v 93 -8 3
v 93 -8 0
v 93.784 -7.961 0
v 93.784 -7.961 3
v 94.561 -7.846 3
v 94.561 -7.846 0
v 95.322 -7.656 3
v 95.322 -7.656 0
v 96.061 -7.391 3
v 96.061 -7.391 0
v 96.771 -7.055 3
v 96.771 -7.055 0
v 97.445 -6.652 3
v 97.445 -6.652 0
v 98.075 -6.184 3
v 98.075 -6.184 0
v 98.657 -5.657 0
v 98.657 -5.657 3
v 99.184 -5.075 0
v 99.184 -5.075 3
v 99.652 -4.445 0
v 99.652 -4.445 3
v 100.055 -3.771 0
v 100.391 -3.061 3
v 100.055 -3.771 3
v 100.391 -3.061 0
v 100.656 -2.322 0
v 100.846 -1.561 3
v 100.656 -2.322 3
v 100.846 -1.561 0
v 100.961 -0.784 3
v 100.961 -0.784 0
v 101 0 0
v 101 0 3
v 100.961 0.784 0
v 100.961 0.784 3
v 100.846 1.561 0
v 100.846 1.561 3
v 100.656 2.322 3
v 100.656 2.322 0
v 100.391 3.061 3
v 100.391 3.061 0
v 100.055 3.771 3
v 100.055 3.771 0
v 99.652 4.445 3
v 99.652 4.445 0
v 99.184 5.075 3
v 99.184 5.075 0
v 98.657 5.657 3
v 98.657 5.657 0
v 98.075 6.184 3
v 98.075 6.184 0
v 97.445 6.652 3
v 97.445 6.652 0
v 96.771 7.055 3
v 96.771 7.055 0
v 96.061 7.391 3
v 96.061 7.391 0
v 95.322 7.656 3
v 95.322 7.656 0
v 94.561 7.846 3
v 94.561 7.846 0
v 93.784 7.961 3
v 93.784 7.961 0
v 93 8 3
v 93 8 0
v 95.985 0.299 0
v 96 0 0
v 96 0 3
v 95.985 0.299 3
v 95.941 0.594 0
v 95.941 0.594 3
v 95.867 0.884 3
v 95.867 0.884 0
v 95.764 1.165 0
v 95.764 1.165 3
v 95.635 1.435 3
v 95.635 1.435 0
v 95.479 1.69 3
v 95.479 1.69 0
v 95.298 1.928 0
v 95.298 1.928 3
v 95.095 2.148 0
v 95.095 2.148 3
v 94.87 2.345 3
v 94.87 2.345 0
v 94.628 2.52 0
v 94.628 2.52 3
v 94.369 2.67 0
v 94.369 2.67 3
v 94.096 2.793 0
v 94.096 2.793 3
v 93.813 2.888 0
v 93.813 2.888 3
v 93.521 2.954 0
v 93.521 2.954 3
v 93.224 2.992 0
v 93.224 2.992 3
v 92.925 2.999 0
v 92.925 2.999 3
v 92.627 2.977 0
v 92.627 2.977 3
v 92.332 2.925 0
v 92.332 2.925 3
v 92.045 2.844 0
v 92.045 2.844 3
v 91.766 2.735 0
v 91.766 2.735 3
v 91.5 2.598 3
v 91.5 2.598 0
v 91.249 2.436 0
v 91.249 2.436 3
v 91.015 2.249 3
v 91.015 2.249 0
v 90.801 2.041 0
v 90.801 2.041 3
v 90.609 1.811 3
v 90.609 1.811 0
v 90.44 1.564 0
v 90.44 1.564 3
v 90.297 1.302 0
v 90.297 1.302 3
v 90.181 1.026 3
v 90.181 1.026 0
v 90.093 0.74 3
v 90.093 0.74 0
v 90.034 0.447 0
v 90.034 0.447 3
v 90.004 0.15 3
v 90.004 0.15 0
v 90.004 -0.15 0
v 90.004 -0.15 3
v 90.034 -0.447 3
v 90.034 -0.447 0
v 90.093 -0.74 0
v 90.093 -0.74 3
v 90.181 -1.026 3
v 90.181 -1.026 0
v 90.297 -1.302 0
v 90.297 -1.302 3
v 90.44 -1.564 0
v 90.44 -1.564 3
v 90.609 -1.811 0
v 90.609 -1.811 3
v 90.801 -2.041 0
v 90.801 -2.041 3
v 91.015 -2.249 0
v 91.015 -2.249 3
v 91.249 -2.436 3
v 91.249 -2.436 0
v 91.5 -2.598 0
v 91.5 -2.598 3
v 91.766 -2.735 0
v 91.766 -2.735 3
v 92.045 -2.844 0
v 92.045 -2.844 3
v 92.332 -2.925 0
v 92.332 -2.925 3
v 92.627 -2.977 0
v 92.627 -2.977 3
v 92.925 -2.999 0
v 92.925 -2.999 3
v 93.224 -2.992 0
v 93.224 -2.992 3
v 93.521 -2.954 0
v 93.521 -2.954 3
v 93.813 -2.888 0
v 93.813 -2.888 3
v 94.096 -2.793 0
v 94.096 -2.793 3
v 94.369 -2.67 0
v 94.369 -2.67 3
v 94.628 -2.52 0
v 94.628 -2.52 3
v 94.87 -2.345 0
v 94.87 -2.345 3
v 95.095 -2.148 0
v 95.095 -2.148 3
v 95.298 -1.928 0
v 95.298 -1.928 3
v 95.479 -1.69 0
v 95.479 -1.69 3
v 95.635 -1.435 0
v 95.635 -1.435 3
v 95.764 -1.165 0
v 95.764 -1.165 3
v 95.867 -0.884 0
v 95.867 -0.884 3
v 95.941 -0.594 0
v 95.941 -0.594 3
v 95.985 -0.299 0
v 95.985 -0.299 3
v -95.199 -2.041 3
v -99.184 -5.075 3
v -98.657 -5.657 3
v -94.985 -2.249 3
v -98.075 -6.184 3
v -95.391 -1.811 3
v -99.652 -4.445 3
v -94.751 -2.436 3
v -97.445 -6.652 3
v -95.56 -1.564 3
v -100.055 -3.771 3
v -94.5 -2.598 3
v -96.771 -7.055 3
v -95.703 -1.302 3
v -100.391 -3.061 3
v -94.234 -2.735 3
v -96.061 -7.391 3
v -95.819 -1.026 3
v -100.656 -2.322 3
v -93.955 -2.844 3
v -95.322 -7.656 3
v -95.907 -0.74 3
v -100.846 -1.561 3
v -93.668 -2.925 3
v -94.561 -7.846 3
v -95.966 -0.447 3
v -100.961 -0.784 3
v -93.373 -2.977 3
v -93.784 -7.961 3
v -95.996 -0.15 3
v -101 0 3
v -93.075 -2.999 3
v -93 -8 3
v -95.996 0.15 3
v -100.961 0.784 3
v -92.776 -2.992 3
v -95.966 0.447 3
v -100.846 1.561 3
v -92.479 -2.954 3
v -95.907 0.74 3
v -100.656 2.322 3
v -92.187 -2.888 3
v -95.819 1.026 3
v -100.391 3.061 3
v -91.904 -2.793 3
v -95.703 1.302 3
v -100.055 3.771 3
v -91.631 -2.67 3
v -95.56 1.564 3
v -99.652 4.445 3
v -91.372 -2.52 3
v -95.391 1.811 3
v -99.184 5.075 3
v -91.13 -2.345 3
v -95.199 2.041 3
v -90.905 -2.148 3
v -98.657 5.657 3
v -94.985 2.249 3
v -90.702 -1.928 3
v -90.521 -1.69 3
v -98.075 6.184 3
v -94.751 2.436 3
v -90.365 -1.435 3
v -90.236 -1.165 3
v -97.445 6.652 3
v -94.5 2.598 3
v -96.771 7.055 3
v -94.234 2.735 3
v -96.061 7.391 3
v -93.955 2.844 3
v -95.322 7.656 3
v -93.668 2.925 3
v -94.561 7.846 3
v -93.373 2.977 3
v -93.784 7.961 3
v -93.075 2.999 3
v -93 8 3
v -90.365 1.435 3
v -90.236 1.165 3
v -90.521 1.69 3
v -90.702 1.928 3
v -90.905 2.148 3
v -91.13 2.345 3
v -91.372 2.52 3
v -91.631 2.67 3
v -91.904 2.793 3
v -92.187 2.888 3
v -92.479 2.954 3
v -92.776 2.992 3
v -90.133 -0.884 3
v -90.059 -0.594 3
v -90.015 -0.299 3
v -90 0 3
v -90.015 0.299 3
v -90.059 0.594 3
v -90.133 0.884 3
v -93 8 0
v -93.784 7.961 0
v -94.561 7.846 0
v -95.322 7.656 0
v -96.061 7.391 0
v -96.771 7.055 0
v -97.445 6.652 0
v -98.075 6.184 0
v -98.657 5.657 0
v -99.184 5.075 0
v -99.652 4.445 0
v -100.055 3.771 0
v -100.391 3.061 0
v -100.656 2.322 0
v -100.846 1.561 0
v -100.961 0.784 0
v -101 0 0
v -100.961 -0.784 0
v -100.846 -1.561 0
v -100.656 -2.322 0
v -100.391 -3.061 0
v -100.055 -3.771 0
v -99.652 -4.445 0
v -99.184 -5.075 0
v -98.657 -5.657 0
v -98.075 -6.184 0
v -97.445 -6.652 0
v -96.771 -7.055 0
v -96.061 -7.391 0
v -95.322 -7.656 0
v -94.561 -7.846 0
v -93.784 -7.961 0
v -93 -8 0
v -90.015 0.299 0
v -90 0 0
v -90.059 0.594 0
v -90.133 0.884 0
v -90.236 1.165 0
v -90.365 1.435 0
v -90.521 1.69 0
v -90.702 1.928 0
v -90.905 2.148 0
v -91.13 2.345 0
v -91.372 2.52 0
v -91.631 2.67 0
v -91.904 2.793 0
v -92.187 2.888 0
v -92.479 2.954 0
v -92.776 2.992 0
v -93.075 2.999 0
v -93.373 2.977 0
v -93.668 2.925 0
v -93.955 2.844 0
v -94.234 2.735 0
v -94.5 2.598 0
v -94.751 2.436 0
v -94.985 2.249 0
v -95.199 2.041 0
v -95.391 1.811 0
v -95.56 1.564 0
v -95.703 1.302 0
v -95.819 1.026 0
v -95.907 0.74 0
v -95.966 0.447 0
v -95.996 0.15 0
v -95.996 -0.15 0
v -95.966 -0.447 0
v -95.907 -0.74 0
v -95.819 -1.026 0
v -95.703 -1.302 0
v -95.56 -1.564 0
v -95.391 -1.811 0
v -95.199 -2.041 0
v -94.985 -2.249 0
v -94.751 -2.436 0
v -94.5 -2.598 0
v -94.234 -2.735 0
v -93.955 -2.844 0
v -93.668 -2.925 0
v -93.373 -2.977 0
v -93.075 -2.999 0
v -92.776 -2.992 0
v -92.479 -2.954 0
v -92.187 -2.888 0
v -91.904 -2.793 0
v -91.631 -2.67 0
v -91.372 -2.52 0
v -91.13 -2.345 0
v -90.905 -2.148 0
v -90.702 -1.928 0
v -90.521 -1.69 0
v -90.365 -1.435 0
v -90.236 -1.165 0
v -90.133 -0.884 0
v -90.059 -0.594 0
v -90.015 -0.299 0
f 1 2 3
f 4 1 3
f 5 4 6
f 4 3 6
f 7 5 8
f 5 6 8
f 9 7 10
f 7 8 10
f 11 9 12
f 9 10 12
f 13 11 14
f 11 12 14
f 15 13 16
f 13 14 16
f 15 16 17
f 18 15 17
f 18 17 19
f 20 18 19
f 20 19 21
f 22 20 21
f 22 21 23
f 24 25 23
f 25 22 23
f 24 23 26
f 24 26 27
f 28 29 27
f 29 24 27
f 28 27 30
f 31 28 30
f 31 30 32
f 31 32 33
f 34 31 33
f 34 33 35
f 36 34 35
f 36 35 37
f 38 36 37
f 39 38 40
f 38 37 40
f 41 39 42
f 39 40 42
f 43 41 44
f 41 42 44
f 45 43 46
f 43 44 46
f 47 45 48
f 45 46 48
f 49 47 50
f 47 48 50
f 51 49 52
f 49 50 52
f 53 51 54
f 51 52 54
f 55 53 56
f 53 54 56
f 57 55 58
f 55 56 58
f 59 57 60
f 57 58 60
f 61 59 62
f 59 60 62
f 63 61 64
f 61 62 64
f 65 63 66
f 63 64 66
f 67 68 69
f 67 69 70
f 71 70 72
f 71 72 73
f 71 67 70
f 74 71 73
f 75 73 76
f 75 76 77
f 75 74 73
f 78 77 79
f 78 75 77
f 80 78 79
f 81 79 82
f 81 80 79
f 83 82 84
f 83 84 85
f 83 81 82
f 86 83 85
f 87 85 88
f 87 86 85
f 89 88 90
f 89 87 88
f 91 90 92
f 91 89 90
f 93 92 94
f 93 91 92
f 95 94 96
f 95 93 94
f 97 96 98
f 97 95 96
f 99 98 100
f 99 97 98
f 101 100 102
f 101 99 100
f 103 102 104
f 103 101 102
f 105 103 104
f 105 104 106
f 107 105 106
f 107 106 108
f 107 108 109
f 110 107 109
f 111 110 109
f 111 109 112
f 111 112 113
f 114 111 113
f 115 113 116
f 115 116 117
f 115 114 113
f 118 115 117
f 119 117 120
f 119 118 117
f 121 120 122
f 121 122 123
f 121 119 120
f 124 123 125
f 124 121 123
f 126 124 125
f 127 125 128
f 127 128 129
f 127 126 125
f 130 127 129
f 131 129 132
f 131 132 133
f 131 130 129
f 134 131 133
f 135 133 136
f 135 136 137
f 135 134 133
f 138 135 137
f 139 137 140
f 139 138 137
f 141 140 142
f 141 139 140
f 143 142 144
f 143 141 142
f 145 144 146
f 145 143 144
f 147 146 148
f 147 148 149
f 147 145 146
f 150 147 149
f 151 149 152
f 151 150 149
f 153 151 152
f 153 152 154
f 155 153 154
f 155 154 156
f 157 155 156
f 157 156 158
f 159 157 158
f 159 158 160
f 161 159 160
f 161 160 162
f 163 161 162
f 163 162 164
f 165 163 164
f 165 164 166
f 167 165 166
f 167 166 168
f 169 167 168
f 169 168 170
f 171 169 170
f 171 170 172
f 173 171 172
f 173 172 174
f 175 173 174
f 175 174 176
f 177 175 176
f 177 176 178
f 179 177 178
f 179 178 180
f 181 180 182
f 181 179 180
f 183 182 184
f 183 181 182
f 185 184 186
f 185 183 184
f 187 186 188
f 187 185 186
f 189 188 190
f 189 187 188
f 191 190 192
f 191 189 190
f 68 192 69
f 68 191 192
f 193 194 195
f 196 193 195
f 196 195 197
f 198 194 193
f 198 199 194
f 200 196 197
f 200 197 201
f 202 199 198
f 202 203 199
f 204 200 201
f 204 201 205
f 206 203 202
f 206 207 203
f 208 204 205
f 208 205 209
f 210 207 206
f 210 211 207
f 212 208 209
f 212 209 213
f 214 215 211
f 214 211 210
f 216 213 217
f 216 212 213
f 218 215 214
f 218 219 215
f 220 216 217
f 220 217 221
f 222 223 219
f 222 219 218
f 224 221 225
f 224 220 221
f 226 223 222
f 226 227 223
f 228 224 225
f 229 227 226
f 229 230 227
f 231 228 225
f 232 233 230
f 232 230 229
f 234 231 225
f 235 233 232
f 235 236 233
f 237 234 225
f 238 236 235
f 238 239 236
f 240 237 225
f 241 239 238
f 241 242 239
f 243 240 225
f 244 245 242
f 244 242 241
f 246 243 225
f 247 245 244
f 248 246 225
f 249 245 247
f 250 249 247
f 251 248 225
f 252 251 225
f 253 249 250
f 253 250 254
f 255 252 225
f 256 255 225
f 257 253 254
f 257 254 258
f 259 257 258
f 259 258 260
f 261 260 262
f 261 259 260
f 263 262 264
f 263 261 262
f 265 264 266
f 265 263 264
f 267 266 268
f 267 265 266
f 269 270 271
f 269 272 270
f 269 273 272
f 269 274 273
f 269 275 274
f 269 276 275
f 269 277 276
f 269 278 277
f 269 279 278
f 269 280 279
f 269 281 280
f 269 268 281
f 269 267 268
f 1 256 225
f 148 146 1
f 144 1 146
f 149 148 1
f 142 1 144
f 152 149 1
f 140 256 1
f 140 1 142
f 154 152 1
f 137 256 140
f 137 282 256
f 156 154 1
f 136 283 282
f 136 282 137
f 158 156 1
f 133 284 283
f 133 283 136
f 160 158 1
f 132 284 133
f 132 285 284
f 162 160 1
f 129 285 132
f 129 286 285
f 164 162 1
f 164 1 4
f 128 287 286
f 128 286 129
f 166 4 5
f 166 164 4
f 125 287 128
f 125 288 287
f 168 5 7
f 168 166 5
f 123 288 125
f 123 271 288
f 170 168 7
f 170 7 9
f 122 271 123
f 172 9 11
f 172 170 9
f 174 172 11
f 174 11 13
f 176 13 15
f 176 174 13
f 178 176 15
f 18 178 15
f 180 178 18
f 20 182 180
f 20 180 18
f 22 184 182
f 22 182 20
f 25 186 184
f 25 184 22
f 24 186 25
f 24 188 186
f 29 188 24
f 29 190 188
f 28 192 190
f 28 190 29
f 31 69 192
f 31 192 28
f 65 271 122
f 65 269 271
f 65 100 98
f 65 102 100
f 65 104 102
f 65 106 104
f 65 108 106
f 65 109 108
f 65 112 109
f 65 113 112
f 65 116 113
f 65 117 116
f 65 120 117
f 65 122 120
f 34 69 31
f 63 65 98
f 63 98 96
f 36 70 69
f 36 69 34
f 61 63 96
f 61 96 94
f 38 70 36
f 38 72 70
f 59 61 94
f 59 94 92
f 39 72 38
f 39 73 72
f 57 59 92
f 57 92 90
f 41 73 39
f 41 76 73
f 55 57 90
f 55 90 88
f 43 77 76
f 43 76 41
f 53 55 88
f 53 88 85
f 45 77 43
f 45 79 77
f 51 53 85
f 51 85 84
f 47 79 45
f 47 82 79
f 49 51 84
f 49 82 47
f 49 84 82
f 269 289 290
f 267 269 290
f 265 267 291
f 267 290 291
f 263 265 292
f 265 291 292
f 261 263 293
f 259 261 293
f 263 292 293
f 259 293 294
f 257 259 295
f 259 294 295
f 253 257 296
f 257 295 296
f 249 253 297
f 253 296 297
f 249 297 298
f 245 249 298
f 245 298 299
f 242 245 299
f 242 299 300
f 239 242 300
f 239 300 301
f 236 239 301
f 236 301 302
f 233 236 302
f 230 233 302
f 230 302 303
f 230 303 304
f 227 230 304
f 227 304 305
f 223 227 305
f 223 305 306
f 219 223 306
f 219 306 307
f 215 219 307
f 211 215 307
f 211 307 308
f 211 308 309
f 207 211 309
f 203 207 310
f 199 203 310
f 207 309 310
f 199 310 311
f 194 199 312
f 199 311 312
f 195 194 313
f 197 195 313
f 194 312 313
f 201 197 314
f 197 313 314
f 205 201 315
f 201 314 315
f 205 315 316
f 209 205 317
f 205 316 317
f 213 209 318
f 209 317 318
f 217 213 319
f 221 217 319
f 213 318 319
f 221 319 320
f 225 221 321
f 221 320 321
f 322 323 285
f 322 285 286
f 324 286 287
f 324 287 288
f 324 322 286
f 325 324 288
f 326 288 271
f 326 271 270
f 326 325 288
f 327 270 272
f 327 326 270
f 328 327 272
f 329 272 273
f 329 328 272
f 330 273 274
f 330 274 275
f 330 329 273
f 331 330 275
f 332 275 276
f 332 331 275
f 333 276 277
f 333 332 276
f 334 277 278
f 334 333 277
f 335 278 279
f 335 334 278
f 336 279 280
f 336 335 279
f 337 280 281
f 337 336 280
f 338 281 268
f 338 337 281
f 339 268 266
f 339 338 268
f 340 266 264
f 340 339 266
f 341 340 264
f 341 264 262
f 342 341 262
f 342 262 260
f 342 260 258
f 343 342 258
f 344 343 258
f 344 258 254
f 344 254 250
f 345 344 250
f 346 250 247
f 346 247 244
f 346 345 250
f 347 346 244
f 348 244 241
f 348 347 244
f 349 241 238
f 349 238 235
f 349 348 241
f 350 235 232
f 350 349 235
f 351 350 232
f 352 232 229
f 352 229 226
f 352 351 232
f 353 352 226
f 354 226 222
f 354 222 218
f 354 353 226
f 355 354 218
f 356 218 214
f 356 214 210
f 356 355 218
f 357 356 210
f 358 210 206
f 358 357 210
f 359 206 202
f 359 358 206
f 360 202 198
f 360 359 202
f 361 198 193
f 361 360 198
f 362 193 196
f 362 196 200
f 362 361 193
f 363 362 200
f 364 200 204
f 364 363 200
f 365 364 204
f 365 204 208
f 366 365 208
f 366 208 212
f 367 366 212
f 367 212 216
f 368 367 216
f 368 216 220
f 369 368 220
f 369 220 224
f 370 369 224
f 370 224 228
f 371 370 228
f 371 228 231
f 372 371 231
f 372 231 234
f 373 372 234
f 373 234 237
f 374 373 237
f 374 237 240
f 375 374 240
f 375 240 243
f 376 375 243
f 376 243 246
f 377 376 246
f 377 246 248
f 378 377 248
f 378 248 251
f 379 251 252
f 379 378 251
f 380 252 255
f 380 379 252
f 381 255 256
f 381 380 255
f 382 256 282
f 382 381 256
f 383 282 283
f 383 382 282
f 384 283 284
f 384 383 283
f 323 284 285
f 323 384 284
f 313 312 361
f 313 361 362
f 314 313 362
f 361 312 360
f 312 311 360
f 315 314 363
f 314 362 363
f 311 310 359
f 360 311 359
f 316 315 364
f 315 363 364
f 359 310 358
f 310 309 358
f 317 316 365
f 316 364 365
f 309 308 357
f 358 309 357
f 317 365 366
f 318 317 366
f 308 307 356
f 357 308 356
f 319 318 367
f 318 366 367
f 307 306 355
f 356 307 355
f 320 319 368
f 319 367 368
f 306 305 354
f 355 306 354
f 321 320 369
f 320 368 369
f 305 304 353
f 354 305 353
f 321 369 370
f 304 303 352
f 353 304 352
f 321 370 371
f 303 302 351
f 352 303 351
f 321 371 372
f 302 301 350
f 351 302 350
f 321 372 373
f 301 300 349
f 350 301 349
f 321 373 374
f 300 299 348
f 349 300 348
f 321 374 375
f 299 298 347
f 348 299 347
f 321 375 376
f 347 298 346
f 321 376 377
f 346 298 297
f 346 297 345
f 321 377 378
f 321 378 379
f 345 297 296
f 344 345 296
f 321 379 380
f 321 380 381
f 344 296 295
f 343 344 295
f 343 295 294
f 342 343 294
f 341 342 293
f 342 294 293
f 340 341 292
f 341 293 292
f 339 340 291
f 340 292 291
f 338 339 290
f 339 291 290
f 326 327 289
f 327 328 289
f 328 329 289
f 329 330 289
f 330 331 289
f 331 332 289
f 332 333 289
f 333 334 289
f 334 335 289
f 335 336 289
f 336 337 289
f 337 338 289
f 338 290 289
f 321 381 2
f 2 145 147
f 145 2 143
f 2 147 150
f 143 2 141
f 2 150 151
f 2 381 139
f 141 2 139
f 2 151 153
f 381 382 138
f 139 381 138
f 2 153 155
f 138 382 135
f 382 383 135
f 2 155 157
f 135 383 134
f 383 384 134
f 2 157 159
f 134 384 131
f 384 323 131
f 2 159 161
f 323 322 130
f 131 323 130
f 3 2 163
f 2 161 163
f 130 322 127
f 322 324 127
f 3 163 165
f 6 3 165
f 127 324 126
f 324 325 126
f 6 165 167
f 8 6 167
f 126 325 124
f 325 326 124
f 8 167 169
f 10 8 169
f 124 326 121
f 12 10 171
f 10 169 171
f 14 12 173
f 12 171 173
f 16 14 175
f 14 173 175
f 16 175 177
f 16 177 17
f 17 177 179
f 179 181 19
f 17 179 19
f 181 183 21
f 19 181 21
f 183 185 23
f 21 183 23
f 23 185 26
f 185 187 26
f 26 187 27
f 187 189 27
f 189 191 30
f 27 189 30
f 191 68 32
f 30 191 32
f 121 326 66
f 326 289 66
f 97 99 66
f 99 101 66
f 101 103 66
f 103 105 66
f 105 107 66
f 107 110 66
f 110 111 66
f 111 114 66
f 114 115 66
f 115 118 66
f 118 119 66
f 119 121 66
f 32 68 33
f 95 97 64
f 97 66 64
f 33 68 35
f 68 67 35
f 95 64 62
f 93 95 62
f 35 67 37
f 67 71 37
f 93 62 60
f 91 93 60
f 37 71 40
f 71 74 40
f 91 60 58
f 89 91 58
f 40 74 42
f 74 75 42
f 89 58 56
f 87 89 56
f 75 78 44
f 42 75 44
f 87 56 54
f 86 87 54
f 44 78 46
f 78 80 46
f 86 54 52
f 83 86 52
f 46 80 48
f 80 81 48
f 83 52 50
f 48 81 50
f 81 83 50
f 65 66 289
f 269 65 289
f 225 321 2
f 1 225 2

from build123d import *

# Parameters (mm, degrees)
SKETCH_1_R      = 8
SKETCH_1_R_2    = 3
EXTRUDE_1_DEPTH = 3


with BuildPart() as part:
    # 草图1 → 凸台-拉伸1 (new body)
    # profile 1 of 3: a face of its own
    with BuildSketch(Plane.XY):
        with BuildLine():
            Line((92.999999991, 8), (-93, 8))
            ThreePointArc((-93, 8), (-87.343145751, 5.656854249), (-85, 0))
            ThreePointArc((-85, 0), (-87.343145751, -5.656854249), (-93, -8))
            Line((-93, -8), (93.000000101, -8))
            ThreePointArc((93.000000101, -8), (85, -5.5e-08), (92.999999991, 8))
        make_face()
    # profile 2 of 3: a face of its own
    with BuildSketch(Plane.XY):
        with Locations((-93, 0)):
            Circle(SKETCH_1_R)
        with Locations((-93, 0)):
            Circle(SKETCH_1_R_2, mode=Mode.SUBTRACT)
    # profile 3 of 3: a face of its own
    with BuildSketch(Plane.XY):
        with Locations((93, 0)):
            Circle(SKETCH_1_R)
        with Locations((93, 0)):
            Circle(SKETCH_1_R_2, mode=Mode.SUBTRACT)
    extrude(amount=EXTRUDE_1_DEPTH)


solid = part.part
